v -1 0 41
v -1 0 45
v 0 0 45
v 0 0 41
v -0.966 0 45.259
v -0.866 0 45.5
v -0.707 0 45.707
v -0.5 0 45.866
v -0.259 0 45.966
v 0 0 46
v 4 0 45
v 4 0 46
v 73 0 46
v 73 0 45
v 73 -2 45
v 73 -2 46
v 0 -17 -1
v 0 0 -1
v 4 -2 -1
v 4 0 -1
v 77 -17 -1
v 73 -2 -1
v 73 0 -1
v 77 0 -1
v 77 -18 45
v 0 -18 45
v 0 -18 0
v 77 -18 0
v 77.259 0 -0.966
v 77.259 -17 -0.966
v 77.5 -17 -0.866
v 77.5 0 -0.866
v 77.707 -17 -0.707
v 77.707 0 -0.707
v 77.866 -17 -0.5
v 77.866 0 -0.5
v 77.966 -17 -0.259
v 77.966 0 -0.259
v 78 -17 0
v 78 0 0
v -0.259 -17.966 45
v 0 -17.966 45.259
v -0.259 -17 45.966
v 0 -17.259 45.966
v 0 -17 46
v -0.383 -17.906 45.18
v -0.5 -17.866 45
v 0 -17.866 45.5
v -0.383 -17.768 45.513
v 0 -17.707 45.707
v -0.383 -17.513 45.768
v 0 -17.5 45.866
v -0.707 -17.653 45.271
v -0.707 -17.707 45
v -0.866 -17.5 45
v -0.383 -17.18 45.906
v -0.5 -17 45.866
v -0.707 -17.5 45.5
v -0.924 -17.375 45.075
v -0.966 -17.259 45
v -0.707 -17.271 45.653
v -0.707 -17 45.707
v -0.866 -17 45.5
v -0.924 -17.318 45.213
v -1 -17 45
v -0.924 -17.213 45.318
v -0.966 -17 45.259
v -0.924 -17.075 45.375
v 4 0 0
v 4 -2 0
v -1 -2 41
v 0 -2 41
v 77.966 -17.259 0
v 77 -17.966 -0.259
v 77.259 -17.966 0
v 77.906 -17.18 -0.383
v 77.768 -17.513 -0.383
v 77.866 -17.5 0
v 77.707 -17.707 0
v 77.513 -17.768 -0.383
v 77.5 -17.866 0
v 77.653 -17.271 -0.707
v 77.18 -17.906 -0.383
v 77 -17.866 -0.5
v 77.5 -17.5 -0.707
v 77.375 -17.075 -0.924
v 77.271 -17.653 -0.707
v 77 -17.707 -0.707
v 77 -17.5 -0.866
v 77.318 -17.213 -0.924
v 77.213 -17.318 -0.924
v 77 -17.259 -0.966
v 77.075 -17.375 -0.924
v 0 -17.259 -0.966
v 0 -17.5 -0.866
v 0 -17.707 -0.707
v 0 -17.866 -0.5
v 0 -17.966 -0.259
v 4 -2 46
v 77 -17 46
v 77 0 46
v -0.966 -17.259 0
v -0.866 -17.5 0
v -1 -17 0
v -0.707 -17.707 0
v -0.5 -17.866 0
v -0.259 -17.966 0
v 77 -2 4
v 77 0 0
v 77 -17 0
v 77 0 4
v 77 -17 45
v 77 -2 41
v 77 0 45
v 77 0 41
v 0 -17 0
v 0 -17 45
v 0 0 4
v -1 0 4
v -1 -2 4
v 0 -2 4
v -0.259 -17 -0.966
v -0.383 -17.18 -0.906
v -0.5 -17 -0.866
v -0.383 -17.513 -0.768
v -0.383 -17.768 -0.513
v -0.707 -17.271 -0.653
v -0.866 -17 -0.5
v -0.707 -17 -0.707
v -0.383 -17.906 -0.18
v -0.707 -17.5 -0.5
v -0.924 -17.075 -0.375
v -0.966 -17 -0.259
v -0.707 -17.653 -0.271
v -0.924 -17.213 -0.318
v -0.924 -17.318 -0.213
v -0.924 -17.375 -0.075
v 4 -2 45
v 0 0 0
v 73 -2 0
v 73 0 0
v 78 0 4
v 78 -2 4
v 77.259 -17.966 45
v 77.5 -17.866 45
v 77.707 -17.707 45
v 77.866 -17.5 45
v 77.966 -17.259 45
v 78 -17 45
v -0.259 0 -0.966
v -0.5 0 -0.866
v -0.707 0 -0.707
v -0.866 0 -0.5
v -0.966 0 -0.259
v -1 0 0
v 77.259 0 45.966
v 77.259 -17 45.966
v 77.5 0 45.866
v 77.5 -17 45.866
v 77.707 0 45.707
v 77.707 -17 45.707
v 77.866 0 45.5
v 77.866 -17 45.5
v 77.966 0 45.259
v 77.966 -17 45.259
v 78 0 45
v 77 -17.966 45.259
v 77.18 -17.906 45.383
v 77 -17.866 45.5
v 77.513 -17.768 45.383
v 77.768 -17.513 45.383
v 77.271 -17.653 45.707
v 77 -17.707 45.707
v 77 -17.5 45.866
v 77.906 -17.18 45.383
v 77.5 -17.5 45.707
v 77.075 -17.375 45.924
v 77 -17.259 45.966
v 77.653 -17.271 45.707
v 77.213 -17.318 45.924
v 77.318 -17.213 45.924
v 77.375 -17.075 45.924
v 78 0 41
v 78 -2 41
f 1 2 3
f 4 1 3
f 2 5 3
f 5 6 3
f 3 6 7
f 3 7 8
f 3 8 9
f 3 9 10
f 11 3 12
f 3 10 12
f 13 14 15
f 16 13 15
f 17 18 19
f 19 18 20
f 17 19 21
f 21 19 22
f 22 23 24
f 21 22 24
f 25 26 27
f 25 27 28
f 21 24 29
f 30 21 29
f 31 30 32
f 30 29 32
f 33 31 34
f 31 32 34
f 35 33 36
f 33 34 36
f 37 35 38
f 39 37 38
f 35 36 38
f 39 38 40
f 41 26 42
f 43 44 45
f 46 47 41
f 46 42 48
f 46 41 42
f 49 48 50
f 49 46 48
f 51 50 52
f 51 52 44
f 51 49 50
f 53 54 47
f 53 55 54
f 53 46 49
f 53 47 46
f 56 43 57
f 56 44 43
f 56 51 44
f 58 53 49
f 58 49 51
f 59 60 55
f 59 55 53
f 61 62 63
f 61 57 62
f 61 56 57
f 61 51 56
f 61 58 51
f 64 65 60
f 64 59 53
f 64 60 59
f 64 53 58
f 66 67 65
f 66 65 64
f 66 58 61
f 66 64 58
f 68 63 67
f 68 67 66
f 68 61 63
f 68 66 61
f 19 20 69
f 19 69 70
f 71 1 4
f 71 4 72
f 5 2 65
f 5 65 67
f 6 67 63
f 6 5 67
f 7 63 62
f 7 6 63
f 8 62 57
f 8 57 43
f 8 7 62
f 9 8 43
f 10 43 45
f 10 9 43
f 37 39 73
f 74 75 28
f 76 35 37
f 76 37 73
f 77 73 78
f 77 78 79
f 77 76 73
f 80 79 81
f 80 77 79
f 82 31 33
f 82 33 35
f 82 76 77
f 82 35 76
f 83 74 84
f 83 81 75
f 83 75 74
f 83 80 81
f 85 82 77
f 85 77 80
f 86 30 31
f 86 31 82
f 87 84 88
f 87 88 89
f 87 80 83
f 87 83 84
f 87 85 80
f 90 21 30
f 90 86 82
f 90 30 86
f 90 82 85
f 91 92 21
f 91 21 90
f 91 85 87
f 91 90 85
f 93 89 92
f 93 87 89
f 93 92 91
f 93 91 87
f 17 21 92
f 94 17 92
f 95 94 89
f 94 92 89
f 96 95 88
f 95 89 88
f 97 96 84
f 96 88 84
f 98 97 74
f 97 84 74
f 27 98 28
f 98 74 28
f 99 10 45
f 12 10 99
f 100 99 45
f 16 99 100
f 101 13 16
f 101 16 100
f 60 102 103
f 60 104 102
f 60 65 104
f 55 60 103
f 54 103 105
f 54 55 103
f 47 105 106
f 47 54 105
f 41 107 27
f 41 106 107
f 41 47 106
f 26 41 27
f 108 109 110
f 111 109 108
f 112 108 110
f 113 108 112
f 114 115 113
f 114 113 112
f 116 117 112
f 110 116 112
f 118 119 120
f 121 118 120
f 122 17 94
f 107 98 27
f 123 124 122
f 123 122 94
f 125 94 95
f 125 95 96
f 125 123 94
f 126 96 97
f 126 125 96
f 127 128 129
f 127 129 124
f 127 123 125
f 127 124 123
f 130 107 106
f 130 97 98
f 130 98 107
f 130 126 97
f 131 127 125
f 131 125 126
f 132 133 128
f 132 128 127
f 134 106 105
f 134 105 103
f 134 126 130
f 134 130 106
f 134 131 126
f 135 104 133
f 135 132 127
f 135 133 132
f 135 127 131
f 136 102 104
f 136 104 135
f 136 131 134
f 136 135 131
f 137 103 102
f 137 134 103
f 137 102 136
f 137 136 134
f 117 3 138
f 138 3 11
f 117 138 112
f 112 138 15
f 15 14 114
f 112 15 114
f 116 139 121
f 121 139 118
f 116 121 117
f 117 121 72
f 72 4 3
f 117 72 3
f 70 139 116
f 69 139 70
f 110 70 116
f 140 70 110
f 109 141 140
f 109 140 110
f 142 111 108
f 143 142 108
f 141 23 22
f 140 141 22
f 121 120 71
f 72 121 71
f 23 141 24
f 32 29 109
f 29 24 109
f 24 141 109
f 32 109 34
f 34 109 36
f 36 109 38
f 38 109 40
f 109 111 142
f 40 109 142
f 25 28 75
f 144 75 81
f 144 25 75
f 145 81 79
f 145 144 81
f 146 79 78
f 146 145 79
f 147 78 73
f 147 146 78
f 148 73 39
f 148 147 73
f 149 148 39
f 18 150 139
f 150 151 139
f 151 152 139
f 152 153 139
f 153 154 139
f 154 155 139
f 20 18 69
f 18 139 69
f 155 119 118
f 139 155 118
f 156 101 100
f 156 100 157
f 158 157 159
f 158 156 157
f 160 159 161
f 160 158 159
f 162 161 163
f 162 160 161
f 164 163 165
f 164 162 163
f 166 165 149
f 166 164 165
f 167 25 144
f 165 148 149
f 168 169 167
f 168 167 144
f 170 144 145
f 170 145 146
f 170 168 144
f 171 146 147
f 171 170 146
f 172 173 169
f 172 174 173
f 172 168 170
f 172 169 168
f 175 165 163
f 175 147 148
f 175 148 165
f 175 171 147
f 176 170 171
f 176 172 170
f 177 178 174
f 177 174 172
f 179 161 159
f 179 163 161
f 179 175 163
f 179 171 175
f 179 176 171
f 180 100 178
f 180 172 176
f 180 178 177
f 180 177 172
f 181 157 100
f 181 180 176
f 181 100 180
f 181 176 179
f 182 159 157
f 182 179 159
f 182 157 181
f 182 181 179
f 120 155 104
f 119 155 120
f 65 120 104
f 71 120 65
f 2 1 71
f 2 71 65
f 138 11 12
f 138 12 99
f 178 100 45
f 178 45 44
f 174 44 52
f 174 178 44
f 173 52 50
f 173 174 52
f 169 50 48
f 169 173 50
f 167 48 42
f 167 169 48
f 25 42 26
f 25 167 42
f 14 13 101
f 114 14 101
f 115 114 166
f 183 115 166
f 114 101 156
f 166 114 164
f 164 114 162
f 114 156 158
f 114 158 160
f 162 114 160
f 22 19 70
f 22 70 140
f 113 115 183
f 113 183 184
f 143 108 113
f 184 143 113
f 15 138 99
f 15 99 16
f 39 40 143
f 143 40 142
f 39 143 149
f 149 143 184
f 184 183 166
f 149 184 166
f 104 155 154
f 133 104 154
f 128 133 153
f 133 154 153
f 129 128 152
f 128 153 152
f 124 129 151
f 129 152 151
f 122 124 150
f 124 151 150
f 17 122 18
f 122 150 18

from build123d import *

# Parameters (mm, degrees)
F0_W         = 79
F0_H         = 47
F0_W_2       = 77
F0_H_2       = 45
F1_DEPTH     = 17
F2_W         = 79
F2_H         = 47
F3_DEPTH     = 1
F4_W         = 2
F4_H         = 37
F5_DEPTH     = 79.001
F6_W         = 69
F6_H         = 2
F7_DEPTH     = 47.001
F8_R         = 1
F9_T1_DEPTH  = 19.5
F9_S5_W      = 1
F9_S5_H      = 1
F9_T6_DEPTH  = 1
F9_S11_W     = 1
F9_S11_H     = 1
F9_T12_DEPTH = 1
F9_S17_W     = 1
F9_S17_H     = 1
F9_T18_DEPTH = 1
F9_S23_W     = 1
F9_S23_H     = 1
F9_T24_DEPTH = 1


# Not quite as in the source:
# - a fillet or chamfer that OpenCascade refuses, or shapes differently, is made with other operations: its cross-section is extruded or revolved along the edge and cut away or added


with BuildPart() as f1:
    # F0 (on Front) → F1 (new body)
    with BuildSketch(Plane.XZ):
        with Locations((38.5, 22.5)):
            Rectangle(F0_W, F0_H)
        with Locations((38.5, 22.5)):
            Rectangle(F0_W_2, F0_H_2, mode=Mode.SUBTRACT)
    extrude(amount=F1_DEPTH)

    # F2 (on face) → F3 (join)
    with BuildSketch(Plane.XZ.offset(17)):
        with Locations((38.5, 22.5)):
            Rectangle(F2_W, F2_H)
    extrude(amount=F3_DEPTH)

    # F4 (on face) → F5 (cut, through all)
    with BuildSketch(Plane(origin=(-1, 0, 0), x_dir=(0, -1, 0), z_dir=(-1, 0, 0))):
        with Locations((1, 22.5)):
            Rectangle(F4_W, F4_H)
    extrude(amount=-F5_DEPTH, mode=Mode.SUBTRACT)

    # F6 (on face) → F7 (cut, through all)
    with BuildSketch(Plane(origin=(0, 0, -1), x_dir=(1, 0, 0), z_dir=(0, 0, -1))):
        with Locations((38.5, 1)):
            Rectangle(F6_W, F6_H)
    extrude(amount=-F7_DEPTH, mode=Mode.SUBTRACT)

    # F8
    f8_edges = [f1.edges().sort_by_distance(p)[0] for p in [
        (38.5, -18, 46),
        (-1, -18, 22.5),
        (38.5, -18, -1),
        (78, -18, 22.5),
    ]]
    fillet(f8_edges, radius=F8_R)

    # F9: fillet of radius 1 on 4 edges, made by hand

    # F9_s2 → F9_t1 (cut)
    with BuildSketch(Plane.XZ.offset(-2.5)):
        with BuildLine():
            ThreePointArc((-1, 45), (-0.7071067812, 45.7071067812), (0, 46))
            Line((0, 46), (-1, 46))
            Line((-1, 46), (-1, 45))
        make_face()
        with BuildLine():
            ThreePointArc((-1, 0), (-0.7071067812, -0.7071067812), (0, -1))
            Line((0, -1), (-1, -1))
            Line((-1, -1), (-1, 0))
        make_face()
        with BuildLine():
            ThreePointArc((77, -1), (77.7071067812, -0.7071067812), (78, 0))
            Line((78, 0), (78, -1))
            Line((78, -1), (77, -1))
        make_face()
        with BuildLine():
            ThreePointArc((77, 46), (77.7071067812, 45.7071067812), (78, 45))
            Line((78, 45), (78, 46))
            Line((78, 46), (77, 46))
        make_face()
    extrude(amount=F9_T1_DEPTH, mode=Mode.SUBTRACT)


with BuildPart() as f9_tool4:
    # F9_s5 → F9_t6 (new body)
    with BuildSketch(Plane.XY.offset(45)):
        with Locations((77.5, -17.5)):
            Rectangle(F9_S5_W, F9_S5_H)
    extrude(amount=F9_T6_DEPTH)

    # F9_s7 → F9_t8 (revolve, cut)
    with BuildSketch(Plane(origin=(77, -17, 45), x_dir=(-0.7071067812, 0.7071067812, 0), z_dir=(0.7071067812, 0.7071067812, 0))):
        with BuildLine():
            ThreePointArc((0, -1), (1, 0), (0, 1))
            Line((0, 1), (0, -1))
        make_face()
    revolve(axis=Axis((77, -17, 45), (0, 0, 1)), mode=Mode.SUBTRACT)


with BuildPart() as f1_1:
    add(f1.part)

    # F9_t3: cut F9_tool4
    add(f9_tool4.part, mode=Mode.SUBTRACT)


with BuildPart() as f9_tool10:
    # F9_s11 → F9_t12 (new body)
    with BuildSketch(Plane.XY):
        with Locations((77.5, -17.5)):
            Rectangle(F9_S11_W, F9_S11_H)
    extrude(amount=-F9_T12_DEPTH)

    # F9_s13 → F9_t14 (revolve, cut)
    with BuildSketch(Plane(origin=(77, -17, 0), x_dir=(-0.7071067812, 0.7071067812, 0), z_dir=(-0.7071067812, -0.7071067812, 0))):
        with BuildLine():
            ThreePointArc((0, -1), (1, 0), (0, 1))
            Line((0, 1), (0, -1))
        make_face()
    revolve(axis=Axis((77, -17, 0), (0, 0, -1)), mode=Mode.SUBTRACT)


with BuildPart() as f1_2:
    add(f1_1.part)

    # F9_t9: cut F9_tool10
    add(f9_tool10.part, mode=Mode.SUBTRACT)


with BuildPart() as f9_tool16:
    # F9_s17 → F9_t18 (new body)
    with BuildSketch(Plane.YZ):
        with Locations((-17.5, -0.5)):
            Rectangle(F9_S17_W, F9_S17_H)
    extrude(amount=-F9_T18_DEPTH)

    # F9_s19 → F9_t20 (revolve, cut)
    with BuildSketch(Plane(origin=(0, -17, 0), x_dir=(0, 0.7071067812, 0.7071067812), z_dir=(0, -0.7071067812, 0.7071067812))):
        with BuildLine():
            ThreePointArc((0, -1), (1, 0), (0, 1))
            Line((0, 1), (0, -1))
        make_face()
    revolve(axis=Axis((0, -17, 0), (-1, 0, 0)), mode=Mode.SUBTRACT)


with BuildPart() as f1_3:
    add(f1_2.part)

    # F9_t15: cut F9_tool16
    add(f9_tool16.part, mode=Mode.SUBTRACT)


with BuildPart() as f9_tool22:
    # F9_s23 → F9_t24 (new body)
    with BuildSketch(Plane.YZ):
        with Locations((-17.5, 45.5)):
            Rectangle(F9_S23_W, F9_S23_H)
    extrude(amount=-F9_T24_DEPTH)

    # F9_s25 → F9_t26 (revolve, cut)
    with BuildSketch(Plane(origin=(0, -17, 45), x_dir=(0, 0.7071067812, -0.7071067812), z_dir=(0, 0.7071067812, 0.7071067812))):
        with BuildLine():
            ThreePointArc((0, -1), (1, 0), (0, 1))
            Line((0, 1), (0, -1))
        make_face()
    revolve(axis=Axis((0, -17, 45), (-1, 0, 0)), mode=Mode.SUBTRACT)


with BuildPart() as f1_4:
    add(f1_3.part)

    # F9_t21: cut F9_tool22
    add(f9_tool22.part, mode=Mode.SUBTRACT)


solid = f1_4.part
